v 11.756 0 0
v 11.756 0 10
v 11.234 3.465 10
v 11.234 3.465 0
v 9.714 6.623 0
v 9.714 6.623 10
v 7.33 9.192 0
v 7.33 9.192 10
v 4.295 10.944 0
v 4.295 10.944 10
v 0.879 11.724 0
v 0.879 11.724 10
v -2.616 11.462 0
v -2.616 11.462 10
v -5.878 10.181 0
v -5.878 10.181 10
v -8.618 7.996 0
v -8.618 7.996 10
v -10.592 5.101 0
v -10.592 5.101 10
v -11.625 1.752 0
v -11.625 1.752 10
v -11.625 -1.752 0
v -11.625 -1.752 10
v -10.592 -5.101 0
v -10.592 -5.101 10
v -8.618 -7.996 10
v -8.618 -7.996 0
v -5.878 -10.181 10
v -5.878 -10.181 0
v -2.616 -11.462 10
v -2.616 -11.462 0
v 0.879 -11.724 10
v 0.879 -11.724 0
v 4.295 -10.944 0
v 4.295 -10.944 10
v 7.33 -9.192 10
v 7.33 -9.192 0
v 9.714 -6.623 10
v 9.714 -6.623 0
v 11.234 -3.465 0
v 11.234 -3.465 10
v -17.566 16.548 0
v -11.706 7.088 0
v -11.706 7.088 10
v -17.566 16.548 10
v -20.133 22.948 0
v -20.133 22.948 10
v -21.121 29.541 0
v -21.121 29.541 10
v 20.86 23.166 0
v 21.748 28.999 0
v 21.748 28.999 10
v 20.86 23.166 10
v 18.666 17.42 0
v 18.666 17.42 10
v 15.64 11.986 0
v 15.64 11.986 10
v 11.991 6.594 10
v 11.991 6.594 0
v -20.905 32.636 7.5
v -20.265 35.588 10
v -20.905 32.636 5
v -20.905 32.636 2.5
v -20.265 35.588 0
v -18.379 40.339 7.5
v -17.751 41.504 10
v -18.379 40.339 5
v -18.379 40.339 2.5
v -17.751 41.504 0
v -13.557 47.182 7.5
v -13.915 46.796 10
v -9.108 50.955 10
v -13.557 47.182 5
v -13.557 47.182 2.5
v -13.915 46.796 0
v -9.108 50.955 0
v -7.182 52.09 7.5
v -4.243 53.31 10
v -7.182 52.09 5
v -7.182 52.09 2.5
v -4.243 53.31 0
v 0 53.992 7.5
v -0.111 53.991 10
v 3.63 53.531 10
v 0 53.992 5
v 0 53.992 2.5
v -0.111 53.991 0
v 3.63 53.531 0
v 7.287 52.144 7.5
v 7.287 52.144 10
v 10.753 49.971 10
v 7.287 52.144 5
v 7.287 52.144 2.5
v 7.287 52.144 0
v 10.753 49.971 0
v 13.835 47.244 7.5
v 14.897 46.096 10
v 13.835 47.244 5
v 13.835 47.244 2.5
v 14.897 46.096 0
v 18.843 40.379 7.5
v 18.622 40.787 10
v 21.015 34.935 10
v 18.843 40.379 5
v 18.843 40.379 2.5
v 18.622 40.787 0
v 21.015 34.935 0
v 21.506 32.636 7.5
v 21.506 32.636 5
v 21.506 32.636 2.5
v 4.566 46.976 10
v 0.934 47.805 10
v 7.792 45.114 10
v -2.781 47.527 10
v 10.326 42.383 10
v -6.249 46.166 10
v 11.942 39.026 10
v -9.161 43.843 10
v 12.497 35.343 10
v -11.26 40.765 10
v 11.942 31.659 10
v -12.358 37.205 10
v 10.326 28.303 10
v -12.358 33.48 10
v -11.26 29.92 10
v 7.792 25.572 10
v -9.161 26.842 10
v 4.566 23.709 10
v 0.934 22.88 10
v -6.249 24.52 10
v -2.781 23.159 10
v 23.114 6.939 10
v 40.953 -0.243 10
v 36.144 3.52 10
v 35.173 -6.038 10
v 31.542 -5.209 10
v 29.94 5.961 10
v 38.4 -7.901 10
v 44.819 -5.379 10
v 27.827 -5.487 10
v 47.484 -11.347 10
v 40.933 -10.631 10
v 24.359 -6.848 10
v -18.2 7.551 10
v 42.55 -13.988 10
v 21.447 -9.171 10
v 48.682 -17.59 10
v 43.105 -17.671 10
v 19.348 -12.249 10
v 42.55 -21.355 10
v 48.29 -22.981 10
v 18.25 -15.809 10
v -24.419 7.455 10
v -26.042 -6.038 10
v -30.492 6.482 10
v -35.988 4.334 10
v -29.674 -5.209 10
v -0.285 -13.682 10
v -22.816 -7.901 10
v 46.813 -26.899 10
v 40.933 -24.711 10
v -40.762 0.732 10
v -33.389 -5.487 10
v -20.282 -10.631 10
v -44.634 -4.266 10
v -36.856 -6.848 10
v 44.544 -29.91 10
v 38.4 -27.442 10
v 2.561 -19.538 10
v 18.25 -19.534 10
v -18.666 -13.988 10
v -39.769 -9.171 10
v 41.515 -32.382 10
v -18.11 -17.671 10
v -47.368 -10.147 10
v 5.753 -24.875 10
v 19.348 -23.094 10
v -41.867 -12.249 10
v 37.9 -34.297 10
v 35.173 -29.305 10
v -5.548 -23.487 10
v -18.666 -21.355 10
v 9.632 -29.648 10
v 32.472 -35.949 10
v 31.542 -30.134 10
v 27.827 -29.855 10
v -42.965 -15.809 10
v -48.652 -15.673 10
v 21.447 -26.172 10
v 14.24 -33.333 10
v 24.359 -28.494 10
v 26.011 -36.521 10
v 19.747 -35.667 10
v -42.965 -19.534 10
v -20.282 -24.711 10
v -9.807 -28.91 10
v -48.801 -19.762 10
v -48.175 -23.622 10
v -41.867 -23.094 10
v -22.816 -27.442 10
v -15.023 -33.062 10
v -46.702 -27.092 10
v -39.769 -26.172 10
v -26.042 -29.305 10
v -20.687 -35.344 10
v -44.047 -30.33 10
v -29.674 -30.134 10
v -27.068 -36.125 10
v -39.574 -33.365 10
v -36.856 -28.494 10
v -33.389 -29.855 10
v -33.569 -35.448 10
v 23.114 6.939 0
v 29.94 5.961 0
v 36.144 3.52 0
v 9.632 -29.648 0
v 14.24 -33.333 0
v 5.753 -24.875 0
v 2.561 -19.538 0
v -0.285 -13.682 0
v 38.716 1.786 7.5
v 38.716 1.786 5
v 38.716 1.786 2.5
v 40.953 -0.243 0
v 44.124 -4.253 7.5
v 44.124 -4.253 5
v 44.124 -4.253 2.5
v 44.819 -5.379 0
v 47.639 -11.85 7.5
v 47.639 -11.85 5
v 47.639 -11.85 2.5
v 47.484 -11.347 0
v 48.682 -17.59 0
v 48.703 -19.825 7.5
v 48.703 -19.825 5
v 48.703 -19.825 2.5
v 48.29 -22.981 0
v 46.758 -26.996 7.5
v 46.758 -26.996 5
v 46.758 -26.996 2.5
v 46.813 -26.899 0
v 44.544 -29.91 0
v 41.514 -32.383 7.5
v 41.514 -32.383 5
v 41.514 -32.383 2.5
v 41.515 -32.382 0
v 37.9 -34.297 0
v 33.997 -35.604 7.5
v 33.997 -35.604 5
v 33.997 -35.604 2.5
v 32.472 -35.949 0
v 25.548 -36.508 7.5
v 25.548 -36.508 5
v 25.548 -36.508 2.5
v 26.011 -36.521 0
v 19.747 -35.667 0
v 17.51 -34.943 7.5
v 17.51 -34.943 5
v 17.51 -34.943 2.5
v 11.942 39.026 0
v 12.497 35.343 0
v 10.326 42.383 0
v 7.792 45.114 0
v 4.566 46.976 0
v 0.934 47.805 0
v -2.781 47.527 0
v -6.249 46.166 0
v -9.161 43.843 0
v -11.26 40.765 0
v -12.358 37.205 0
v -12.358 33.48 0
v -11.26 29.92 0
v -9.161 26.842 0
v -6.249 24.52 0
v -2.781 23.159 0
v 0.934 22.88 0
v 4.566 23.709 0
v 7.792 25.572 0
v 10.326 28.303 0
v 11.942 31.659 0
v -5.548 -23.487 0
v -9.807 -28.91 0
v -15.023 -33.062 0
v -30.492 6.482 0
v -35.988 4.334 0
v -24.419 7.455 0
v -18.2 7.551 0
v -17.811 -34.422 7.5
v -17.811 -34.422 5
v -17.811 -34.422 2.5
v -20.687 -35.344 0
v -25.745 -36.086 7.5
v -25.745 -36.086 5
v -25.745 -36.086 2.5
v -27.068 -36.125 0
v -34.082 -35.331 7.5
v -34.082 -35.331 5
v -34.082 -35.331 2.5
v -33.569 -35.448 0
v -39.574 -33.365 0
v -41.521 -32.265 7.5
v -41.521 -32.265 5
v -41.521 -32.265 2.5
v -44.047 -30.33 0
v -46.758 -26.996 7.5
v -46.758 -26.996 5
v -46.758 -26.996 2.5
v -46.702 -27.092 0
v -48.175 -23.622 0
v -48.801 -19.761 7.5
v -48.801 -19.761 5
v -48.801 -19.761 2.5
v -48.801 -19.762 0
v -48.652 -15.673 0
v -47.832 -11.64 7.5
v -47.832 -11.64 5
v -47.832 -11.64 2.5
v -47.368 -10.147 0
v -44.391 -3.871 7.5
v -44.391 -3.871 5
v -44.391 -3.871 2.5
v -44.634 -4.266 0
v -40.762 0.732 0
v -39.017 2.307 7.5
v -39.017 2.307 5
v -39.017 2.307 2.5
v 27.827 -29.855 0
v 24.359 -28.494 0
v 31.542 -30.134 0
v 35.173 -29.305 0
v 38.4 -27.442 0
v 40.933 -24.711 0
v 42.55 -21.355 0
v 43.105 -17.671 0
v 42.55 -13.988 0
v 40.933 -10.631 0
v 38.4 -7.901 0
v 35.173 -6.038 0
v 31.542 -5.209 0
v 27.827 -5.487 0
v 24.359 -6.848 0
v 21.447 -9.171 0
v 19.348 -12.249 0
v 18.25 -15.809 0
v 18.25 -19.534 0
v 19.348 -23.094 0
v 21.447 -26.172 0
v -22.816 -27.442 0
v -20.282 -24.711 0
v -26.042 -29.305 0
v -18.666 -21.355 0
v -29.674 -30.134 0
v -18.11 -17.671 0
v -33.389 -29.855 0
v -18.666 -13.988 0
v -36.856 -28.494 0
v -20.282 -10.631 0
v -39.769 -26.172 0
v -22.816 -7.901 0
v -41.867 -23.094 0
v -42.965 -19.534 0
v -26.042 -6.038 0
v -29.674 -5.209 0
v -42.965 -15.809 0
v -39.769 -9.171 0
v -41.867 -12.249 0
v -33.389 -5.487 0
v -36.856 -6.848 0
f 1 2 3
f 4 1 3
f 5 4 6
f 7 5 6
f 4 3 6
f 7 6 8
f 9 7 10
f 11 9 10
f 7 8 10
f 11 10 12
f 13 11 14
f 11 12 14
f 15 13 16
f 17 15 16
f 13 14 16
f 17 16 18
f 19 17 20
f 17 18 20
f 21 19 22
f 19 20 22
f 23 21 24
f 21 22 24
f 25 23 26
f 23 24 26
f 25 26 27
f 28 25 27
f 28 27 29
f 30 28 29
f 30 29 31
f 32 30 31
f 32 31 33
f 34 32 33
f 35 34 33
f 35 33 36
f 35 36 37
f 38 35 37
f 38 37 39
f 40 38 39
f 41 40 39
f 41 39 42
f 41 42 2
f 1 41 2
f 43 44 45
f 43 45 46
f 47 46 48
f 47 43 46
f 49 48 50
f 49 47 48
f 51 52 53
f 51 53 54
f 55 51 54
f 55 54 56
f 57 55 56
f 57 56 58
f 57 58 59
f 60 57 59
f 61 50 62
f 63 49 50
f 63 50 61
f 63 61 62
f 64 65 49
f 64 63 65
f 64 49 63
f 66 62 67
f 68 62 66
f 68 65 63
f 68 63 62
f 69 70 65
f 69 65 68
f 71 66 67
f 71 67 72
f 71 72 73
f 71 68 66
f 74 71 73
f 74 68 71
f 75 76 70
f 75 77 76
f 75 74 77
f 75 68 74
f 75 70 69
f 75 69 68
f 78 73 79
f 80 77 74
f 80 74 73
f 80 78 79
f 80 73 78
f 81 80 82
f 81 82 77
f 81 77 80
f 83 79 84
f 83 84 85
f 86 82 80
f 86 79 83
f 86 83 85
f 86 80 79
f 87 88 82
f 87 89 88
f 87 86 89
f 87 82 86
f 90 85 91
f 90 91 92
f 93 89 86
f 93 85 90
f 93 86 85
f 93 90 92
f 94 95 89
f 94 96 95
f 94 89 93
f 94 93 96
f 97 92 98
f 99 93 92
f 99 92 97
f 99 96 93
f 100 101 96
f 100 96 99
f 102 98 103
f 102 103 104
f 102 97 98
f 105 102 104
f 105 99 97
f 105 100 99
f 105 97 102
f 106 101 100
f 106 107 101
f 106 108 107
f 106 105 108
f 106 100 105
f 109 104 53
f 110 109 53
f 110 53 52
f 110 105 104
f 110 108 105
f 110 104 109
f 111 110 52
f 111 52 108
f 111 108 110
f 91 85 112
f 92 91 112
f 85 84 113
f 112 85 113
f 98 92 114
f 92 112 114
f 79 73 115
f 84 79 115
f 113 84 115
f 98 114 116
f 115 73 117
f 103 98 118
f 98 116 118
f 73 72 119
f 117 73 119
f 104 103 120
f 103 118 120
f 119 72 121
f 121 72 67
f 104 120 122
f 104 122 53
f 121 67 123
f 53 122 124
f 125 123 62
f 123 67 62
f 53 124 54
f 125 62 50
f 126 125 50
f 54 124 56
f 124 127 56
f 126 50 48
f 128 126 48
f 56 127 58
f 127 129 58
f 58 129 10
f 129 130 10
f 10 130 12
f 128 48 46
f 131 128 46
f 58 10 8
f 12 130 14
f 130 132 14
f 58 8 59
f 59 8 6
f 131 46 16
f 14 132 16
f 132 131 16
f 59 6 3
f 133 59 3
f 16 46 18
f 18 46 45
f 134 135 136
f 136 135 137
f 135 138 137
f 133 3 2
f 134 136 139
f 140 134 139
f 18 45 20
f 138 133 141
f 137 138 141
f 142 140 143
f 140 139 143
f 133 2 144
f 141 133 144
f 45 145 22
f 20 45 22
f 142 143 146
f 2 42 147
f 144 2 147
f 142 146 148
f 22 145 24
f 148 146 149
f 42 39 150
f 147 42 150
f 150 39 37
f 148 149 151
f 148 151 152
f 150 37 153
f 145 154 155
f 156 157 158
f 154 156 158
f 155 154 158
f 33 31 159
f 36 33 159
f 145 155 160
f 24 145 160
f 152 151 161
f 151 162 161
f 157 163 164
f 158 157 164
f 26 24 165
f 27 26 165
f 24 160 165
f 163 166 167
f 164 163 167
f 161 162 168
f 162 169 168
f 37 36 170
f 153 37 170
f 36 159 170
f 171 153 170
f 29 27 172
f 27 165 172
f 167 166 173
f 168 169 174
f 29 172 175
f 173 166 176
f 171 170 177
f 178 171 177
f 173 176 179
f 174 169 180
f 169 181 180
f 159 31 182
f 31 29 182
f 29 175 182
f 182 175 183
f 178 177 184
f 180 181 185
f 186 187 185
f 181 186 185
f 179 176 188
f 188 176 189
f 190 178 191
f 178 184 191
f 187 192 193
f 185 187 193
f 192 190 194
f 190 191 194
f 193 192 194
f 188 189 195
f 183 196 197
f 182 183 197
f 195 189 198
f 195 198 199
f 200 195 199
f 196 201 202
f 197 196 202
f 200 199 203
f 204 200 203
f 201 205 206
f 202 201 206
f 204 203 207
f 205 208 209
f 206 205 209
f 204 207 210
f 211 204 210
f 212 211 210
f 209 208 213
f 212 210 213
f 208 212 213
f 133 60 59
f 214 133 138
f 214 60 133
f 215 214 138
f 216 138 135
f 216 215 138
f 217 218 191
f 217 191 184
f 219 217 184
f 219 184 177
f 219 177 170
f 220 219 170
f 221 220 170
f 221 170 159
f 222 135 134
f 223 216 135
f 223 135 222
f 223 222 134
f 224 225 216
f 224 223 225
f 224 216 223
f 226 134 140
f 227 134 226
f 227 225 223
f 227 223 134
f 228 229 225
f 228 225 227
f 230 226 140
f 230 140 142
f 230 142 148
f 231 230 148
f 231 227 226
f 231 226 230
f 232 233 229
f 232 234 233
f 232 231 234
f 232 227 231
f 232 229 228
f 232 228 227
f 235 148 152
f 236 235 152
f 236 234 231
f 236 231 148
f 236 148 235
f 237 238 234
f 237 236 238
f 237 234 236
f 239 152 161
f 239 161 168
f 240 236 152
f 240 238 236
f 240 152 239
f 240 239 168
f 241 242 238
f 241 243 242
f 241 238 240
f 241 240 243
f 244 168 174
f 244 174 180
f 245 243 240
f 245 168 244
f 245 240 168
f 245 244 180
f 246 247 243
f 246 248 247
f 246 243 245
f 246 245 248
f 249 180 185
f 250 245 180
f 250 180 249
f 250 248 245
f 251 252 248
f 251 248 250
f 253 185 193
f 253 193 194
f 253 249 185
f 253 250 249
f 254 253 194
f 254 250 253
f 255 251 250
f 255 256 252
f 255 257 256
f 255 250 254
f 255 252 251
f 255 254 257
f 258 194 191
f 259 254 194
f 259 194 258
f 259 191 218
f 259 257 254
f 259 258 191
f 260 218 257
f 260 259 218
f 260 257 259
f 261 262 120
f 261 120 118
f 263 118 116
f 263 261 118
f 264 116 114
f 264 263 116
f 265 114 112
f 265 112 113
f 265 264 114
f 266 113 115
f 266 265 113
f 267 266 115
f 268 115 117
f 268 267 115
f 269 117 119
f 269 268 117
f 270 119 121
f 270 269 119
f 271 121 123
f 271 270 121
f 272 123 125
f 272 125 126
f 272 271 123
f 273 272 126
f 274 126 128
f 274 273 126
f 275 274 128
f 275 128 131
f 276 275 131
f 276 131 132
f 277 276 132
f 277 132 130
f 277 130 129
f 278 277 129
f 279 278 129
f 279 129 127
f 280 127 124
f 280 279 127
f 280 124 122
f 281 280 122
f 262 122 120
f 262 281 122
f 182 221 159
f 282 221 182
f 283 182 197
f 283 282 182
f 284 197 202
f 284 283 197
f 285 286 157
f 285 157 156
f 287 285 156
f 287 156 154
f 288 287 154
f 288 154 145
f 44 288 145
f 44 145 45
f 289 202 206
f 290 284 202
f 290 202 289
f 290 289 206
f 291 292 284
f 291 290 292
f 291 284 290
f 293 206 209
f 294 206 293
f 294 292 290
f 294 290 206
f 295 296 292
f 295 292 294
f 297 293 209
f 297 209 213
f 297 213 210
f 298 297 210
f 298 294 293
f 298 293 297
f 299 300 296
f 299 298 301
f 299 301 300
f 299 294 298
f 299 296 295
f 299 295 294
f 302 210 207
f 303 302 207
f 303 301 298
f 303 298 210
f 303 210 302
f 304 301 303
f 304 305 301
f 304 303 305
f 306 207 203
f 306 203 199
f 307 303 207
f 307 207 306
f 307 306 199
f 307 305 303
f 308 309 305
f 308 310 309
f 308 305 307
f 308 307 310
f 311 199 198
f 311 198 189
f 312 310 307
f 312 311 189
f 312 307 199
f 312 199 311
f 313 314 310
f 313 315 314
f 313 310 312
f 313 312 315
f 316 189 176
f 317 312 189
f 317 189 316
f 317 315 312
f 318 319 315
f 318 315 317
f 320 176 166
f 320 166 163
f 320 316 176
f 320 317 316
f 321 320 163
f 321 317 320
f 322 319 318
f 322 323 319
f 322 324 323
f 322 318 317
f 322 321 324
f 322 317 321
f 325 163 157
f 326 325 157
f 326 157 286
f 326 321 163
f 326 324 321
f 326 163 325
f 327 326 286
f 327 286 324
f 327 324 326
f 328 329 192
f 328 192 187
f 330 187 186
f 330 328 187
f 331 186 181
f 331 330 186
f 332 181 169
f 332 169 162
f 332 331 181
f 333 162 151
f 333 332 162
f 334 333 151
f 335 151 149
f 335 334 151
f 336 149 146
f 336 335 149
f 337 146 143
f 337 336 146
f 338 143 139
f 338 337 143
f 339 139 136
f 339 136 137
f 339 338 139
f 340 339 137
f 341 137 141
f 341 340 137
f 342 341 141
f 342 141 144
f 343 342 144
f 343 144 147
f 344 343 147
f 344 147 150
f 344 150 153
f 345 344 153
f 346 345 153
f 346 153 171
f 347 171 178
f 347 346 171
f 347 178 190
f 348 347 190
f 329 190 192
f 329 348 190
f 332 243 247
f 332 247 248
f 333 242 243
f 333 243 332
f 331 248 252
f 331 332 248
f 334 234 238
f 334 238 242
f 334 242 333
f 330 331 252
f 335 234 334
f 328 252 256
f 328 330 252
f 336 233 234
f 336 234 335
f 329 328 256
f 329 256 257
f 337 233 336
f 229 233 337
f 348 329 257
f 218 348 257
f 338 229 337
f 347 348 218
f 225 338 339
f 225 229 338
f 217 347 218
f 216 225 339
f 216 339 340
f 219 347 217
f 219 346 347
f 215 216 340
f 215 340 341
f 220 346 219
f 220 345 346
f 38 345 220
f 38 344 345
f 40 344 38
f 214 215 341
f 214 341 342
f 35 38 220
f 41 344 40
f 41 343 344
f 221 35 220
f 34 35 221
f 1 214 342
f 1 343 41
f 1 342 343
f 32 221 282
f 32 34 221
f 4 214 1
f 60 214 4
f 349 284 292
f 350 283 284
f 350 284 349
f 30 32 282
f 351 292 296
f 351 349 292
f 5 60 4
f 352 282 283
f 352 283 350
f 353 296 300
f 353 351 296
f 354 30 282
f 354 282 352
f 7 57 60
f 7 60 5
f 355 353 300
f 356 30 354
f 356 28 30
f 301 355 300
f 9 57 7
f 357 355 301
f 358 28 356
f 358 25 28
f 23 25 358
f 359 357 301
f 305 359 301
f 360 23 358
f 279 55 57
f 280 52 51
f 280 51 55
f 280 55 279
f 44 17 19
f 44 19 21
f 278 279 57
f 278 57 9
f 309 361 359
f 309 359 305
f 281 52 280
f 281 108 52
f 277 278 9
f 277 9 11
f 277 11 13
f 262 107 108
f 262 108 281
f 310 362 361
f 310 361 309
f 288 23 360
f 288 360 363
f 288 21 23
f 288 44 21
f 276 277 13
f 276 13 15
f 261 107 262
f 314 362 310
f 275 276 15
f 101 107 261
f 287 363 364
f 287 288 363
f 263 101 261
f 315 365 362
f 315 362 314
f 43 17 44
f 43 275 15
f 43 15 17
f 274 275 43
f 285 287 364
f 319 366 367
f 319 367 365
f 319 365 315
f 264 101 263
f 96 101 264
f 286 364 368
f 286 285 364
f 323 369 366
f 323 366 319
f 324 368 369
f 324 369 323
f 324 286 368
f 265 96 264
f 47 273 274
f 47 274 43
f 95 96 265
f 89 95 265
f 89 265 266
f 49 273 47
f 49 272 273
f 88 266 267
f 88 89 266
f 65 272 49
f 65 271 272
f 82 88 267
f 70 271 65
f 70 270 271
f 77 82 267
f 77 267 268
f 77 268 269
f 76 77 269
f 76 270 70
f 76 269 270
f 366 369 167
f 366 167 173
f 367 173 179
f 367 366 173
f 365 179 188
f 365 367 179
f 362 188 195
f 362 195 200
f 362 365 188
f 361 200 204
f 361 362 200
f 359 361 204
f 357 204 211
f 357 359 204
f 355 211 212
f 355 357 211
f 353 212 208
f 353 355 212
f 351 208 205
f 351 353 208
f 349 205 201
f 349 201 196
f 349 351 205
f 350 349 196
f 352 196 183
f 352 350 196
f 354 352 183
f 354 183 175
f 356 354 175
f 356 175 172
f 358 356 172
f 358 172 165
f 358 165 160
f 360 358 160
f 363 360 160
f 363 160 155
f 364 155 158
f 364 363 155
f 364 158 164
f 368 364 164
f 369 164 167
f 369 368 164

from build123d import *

# Parameters (mm, degrees)
F2_DEPTH = 10
F1_R     = 12.4972501237
F3_DEPTH = 10
F5_COUNT = 3
F7_R     = 11.7564956946
F8_DEPTH = 25


with BuildPart() as f2:
    # F0 (on Top) → F2 (new body)
    with BuildSketch(Plane.XY):
        with BuildLine():
            add(Edge.make_bspline(
                [(-6.4669726416, 0), (-14.5083259359, 10.6529102033), (-29.9083676831, 31.0543595436), (-0.0986403159, 64.9506774693), (30.7475860755, 31.1456715655), (15.1734467914, 10.6605848326), (7.0685539395, 0)],
                knots=[0, 0, 0, 0, 0.2606421354, 0.4991572462, 0.7393578687, 1, 1, 1, 1], degree=3))
            Line((-6.4669726416, 0), (7.0685539395, 0))
        make_face()
    extrude(amount=F2_DEPTH)

    # F1 (on face) → F3 (cut)
    with BuildSketch(Plane.XY):
        with Locations((0, 35.3427641094)):
            Circle(F1_R)
    extrude(amount=F3_DEPTH, mode=Mode.SUBTRACT)


with BuildPart() as f5_1:
    # F5: instance of F2
    add(f2.part.rotate(Axis((0, 0, 13.7014295906), (0, 0, 1)), 1 * 360 / F5_COUNT))


with BuildPart() as f5_2:
    # F5: instance of F2
    add(f2.part.rotate(Axis((0, 0, 13.7014295906), (0, 0, 1)), 2 * 360 / F5_COUNT))


with BuildPart() as f2_1:
    add(f2.part)

    # F6: union F5_2, F5_1
    add(f5_2.part)
    add(f5_1.part)

    # F7 (on face) → F8 (cut)
    with BuildSketch(Plane.XY.offset(10)):
        Circle(F7_R)
    extrude(amount=-F8_DEPTH, mode=Mode.SUBTRACT)


solid = f2_1.part
